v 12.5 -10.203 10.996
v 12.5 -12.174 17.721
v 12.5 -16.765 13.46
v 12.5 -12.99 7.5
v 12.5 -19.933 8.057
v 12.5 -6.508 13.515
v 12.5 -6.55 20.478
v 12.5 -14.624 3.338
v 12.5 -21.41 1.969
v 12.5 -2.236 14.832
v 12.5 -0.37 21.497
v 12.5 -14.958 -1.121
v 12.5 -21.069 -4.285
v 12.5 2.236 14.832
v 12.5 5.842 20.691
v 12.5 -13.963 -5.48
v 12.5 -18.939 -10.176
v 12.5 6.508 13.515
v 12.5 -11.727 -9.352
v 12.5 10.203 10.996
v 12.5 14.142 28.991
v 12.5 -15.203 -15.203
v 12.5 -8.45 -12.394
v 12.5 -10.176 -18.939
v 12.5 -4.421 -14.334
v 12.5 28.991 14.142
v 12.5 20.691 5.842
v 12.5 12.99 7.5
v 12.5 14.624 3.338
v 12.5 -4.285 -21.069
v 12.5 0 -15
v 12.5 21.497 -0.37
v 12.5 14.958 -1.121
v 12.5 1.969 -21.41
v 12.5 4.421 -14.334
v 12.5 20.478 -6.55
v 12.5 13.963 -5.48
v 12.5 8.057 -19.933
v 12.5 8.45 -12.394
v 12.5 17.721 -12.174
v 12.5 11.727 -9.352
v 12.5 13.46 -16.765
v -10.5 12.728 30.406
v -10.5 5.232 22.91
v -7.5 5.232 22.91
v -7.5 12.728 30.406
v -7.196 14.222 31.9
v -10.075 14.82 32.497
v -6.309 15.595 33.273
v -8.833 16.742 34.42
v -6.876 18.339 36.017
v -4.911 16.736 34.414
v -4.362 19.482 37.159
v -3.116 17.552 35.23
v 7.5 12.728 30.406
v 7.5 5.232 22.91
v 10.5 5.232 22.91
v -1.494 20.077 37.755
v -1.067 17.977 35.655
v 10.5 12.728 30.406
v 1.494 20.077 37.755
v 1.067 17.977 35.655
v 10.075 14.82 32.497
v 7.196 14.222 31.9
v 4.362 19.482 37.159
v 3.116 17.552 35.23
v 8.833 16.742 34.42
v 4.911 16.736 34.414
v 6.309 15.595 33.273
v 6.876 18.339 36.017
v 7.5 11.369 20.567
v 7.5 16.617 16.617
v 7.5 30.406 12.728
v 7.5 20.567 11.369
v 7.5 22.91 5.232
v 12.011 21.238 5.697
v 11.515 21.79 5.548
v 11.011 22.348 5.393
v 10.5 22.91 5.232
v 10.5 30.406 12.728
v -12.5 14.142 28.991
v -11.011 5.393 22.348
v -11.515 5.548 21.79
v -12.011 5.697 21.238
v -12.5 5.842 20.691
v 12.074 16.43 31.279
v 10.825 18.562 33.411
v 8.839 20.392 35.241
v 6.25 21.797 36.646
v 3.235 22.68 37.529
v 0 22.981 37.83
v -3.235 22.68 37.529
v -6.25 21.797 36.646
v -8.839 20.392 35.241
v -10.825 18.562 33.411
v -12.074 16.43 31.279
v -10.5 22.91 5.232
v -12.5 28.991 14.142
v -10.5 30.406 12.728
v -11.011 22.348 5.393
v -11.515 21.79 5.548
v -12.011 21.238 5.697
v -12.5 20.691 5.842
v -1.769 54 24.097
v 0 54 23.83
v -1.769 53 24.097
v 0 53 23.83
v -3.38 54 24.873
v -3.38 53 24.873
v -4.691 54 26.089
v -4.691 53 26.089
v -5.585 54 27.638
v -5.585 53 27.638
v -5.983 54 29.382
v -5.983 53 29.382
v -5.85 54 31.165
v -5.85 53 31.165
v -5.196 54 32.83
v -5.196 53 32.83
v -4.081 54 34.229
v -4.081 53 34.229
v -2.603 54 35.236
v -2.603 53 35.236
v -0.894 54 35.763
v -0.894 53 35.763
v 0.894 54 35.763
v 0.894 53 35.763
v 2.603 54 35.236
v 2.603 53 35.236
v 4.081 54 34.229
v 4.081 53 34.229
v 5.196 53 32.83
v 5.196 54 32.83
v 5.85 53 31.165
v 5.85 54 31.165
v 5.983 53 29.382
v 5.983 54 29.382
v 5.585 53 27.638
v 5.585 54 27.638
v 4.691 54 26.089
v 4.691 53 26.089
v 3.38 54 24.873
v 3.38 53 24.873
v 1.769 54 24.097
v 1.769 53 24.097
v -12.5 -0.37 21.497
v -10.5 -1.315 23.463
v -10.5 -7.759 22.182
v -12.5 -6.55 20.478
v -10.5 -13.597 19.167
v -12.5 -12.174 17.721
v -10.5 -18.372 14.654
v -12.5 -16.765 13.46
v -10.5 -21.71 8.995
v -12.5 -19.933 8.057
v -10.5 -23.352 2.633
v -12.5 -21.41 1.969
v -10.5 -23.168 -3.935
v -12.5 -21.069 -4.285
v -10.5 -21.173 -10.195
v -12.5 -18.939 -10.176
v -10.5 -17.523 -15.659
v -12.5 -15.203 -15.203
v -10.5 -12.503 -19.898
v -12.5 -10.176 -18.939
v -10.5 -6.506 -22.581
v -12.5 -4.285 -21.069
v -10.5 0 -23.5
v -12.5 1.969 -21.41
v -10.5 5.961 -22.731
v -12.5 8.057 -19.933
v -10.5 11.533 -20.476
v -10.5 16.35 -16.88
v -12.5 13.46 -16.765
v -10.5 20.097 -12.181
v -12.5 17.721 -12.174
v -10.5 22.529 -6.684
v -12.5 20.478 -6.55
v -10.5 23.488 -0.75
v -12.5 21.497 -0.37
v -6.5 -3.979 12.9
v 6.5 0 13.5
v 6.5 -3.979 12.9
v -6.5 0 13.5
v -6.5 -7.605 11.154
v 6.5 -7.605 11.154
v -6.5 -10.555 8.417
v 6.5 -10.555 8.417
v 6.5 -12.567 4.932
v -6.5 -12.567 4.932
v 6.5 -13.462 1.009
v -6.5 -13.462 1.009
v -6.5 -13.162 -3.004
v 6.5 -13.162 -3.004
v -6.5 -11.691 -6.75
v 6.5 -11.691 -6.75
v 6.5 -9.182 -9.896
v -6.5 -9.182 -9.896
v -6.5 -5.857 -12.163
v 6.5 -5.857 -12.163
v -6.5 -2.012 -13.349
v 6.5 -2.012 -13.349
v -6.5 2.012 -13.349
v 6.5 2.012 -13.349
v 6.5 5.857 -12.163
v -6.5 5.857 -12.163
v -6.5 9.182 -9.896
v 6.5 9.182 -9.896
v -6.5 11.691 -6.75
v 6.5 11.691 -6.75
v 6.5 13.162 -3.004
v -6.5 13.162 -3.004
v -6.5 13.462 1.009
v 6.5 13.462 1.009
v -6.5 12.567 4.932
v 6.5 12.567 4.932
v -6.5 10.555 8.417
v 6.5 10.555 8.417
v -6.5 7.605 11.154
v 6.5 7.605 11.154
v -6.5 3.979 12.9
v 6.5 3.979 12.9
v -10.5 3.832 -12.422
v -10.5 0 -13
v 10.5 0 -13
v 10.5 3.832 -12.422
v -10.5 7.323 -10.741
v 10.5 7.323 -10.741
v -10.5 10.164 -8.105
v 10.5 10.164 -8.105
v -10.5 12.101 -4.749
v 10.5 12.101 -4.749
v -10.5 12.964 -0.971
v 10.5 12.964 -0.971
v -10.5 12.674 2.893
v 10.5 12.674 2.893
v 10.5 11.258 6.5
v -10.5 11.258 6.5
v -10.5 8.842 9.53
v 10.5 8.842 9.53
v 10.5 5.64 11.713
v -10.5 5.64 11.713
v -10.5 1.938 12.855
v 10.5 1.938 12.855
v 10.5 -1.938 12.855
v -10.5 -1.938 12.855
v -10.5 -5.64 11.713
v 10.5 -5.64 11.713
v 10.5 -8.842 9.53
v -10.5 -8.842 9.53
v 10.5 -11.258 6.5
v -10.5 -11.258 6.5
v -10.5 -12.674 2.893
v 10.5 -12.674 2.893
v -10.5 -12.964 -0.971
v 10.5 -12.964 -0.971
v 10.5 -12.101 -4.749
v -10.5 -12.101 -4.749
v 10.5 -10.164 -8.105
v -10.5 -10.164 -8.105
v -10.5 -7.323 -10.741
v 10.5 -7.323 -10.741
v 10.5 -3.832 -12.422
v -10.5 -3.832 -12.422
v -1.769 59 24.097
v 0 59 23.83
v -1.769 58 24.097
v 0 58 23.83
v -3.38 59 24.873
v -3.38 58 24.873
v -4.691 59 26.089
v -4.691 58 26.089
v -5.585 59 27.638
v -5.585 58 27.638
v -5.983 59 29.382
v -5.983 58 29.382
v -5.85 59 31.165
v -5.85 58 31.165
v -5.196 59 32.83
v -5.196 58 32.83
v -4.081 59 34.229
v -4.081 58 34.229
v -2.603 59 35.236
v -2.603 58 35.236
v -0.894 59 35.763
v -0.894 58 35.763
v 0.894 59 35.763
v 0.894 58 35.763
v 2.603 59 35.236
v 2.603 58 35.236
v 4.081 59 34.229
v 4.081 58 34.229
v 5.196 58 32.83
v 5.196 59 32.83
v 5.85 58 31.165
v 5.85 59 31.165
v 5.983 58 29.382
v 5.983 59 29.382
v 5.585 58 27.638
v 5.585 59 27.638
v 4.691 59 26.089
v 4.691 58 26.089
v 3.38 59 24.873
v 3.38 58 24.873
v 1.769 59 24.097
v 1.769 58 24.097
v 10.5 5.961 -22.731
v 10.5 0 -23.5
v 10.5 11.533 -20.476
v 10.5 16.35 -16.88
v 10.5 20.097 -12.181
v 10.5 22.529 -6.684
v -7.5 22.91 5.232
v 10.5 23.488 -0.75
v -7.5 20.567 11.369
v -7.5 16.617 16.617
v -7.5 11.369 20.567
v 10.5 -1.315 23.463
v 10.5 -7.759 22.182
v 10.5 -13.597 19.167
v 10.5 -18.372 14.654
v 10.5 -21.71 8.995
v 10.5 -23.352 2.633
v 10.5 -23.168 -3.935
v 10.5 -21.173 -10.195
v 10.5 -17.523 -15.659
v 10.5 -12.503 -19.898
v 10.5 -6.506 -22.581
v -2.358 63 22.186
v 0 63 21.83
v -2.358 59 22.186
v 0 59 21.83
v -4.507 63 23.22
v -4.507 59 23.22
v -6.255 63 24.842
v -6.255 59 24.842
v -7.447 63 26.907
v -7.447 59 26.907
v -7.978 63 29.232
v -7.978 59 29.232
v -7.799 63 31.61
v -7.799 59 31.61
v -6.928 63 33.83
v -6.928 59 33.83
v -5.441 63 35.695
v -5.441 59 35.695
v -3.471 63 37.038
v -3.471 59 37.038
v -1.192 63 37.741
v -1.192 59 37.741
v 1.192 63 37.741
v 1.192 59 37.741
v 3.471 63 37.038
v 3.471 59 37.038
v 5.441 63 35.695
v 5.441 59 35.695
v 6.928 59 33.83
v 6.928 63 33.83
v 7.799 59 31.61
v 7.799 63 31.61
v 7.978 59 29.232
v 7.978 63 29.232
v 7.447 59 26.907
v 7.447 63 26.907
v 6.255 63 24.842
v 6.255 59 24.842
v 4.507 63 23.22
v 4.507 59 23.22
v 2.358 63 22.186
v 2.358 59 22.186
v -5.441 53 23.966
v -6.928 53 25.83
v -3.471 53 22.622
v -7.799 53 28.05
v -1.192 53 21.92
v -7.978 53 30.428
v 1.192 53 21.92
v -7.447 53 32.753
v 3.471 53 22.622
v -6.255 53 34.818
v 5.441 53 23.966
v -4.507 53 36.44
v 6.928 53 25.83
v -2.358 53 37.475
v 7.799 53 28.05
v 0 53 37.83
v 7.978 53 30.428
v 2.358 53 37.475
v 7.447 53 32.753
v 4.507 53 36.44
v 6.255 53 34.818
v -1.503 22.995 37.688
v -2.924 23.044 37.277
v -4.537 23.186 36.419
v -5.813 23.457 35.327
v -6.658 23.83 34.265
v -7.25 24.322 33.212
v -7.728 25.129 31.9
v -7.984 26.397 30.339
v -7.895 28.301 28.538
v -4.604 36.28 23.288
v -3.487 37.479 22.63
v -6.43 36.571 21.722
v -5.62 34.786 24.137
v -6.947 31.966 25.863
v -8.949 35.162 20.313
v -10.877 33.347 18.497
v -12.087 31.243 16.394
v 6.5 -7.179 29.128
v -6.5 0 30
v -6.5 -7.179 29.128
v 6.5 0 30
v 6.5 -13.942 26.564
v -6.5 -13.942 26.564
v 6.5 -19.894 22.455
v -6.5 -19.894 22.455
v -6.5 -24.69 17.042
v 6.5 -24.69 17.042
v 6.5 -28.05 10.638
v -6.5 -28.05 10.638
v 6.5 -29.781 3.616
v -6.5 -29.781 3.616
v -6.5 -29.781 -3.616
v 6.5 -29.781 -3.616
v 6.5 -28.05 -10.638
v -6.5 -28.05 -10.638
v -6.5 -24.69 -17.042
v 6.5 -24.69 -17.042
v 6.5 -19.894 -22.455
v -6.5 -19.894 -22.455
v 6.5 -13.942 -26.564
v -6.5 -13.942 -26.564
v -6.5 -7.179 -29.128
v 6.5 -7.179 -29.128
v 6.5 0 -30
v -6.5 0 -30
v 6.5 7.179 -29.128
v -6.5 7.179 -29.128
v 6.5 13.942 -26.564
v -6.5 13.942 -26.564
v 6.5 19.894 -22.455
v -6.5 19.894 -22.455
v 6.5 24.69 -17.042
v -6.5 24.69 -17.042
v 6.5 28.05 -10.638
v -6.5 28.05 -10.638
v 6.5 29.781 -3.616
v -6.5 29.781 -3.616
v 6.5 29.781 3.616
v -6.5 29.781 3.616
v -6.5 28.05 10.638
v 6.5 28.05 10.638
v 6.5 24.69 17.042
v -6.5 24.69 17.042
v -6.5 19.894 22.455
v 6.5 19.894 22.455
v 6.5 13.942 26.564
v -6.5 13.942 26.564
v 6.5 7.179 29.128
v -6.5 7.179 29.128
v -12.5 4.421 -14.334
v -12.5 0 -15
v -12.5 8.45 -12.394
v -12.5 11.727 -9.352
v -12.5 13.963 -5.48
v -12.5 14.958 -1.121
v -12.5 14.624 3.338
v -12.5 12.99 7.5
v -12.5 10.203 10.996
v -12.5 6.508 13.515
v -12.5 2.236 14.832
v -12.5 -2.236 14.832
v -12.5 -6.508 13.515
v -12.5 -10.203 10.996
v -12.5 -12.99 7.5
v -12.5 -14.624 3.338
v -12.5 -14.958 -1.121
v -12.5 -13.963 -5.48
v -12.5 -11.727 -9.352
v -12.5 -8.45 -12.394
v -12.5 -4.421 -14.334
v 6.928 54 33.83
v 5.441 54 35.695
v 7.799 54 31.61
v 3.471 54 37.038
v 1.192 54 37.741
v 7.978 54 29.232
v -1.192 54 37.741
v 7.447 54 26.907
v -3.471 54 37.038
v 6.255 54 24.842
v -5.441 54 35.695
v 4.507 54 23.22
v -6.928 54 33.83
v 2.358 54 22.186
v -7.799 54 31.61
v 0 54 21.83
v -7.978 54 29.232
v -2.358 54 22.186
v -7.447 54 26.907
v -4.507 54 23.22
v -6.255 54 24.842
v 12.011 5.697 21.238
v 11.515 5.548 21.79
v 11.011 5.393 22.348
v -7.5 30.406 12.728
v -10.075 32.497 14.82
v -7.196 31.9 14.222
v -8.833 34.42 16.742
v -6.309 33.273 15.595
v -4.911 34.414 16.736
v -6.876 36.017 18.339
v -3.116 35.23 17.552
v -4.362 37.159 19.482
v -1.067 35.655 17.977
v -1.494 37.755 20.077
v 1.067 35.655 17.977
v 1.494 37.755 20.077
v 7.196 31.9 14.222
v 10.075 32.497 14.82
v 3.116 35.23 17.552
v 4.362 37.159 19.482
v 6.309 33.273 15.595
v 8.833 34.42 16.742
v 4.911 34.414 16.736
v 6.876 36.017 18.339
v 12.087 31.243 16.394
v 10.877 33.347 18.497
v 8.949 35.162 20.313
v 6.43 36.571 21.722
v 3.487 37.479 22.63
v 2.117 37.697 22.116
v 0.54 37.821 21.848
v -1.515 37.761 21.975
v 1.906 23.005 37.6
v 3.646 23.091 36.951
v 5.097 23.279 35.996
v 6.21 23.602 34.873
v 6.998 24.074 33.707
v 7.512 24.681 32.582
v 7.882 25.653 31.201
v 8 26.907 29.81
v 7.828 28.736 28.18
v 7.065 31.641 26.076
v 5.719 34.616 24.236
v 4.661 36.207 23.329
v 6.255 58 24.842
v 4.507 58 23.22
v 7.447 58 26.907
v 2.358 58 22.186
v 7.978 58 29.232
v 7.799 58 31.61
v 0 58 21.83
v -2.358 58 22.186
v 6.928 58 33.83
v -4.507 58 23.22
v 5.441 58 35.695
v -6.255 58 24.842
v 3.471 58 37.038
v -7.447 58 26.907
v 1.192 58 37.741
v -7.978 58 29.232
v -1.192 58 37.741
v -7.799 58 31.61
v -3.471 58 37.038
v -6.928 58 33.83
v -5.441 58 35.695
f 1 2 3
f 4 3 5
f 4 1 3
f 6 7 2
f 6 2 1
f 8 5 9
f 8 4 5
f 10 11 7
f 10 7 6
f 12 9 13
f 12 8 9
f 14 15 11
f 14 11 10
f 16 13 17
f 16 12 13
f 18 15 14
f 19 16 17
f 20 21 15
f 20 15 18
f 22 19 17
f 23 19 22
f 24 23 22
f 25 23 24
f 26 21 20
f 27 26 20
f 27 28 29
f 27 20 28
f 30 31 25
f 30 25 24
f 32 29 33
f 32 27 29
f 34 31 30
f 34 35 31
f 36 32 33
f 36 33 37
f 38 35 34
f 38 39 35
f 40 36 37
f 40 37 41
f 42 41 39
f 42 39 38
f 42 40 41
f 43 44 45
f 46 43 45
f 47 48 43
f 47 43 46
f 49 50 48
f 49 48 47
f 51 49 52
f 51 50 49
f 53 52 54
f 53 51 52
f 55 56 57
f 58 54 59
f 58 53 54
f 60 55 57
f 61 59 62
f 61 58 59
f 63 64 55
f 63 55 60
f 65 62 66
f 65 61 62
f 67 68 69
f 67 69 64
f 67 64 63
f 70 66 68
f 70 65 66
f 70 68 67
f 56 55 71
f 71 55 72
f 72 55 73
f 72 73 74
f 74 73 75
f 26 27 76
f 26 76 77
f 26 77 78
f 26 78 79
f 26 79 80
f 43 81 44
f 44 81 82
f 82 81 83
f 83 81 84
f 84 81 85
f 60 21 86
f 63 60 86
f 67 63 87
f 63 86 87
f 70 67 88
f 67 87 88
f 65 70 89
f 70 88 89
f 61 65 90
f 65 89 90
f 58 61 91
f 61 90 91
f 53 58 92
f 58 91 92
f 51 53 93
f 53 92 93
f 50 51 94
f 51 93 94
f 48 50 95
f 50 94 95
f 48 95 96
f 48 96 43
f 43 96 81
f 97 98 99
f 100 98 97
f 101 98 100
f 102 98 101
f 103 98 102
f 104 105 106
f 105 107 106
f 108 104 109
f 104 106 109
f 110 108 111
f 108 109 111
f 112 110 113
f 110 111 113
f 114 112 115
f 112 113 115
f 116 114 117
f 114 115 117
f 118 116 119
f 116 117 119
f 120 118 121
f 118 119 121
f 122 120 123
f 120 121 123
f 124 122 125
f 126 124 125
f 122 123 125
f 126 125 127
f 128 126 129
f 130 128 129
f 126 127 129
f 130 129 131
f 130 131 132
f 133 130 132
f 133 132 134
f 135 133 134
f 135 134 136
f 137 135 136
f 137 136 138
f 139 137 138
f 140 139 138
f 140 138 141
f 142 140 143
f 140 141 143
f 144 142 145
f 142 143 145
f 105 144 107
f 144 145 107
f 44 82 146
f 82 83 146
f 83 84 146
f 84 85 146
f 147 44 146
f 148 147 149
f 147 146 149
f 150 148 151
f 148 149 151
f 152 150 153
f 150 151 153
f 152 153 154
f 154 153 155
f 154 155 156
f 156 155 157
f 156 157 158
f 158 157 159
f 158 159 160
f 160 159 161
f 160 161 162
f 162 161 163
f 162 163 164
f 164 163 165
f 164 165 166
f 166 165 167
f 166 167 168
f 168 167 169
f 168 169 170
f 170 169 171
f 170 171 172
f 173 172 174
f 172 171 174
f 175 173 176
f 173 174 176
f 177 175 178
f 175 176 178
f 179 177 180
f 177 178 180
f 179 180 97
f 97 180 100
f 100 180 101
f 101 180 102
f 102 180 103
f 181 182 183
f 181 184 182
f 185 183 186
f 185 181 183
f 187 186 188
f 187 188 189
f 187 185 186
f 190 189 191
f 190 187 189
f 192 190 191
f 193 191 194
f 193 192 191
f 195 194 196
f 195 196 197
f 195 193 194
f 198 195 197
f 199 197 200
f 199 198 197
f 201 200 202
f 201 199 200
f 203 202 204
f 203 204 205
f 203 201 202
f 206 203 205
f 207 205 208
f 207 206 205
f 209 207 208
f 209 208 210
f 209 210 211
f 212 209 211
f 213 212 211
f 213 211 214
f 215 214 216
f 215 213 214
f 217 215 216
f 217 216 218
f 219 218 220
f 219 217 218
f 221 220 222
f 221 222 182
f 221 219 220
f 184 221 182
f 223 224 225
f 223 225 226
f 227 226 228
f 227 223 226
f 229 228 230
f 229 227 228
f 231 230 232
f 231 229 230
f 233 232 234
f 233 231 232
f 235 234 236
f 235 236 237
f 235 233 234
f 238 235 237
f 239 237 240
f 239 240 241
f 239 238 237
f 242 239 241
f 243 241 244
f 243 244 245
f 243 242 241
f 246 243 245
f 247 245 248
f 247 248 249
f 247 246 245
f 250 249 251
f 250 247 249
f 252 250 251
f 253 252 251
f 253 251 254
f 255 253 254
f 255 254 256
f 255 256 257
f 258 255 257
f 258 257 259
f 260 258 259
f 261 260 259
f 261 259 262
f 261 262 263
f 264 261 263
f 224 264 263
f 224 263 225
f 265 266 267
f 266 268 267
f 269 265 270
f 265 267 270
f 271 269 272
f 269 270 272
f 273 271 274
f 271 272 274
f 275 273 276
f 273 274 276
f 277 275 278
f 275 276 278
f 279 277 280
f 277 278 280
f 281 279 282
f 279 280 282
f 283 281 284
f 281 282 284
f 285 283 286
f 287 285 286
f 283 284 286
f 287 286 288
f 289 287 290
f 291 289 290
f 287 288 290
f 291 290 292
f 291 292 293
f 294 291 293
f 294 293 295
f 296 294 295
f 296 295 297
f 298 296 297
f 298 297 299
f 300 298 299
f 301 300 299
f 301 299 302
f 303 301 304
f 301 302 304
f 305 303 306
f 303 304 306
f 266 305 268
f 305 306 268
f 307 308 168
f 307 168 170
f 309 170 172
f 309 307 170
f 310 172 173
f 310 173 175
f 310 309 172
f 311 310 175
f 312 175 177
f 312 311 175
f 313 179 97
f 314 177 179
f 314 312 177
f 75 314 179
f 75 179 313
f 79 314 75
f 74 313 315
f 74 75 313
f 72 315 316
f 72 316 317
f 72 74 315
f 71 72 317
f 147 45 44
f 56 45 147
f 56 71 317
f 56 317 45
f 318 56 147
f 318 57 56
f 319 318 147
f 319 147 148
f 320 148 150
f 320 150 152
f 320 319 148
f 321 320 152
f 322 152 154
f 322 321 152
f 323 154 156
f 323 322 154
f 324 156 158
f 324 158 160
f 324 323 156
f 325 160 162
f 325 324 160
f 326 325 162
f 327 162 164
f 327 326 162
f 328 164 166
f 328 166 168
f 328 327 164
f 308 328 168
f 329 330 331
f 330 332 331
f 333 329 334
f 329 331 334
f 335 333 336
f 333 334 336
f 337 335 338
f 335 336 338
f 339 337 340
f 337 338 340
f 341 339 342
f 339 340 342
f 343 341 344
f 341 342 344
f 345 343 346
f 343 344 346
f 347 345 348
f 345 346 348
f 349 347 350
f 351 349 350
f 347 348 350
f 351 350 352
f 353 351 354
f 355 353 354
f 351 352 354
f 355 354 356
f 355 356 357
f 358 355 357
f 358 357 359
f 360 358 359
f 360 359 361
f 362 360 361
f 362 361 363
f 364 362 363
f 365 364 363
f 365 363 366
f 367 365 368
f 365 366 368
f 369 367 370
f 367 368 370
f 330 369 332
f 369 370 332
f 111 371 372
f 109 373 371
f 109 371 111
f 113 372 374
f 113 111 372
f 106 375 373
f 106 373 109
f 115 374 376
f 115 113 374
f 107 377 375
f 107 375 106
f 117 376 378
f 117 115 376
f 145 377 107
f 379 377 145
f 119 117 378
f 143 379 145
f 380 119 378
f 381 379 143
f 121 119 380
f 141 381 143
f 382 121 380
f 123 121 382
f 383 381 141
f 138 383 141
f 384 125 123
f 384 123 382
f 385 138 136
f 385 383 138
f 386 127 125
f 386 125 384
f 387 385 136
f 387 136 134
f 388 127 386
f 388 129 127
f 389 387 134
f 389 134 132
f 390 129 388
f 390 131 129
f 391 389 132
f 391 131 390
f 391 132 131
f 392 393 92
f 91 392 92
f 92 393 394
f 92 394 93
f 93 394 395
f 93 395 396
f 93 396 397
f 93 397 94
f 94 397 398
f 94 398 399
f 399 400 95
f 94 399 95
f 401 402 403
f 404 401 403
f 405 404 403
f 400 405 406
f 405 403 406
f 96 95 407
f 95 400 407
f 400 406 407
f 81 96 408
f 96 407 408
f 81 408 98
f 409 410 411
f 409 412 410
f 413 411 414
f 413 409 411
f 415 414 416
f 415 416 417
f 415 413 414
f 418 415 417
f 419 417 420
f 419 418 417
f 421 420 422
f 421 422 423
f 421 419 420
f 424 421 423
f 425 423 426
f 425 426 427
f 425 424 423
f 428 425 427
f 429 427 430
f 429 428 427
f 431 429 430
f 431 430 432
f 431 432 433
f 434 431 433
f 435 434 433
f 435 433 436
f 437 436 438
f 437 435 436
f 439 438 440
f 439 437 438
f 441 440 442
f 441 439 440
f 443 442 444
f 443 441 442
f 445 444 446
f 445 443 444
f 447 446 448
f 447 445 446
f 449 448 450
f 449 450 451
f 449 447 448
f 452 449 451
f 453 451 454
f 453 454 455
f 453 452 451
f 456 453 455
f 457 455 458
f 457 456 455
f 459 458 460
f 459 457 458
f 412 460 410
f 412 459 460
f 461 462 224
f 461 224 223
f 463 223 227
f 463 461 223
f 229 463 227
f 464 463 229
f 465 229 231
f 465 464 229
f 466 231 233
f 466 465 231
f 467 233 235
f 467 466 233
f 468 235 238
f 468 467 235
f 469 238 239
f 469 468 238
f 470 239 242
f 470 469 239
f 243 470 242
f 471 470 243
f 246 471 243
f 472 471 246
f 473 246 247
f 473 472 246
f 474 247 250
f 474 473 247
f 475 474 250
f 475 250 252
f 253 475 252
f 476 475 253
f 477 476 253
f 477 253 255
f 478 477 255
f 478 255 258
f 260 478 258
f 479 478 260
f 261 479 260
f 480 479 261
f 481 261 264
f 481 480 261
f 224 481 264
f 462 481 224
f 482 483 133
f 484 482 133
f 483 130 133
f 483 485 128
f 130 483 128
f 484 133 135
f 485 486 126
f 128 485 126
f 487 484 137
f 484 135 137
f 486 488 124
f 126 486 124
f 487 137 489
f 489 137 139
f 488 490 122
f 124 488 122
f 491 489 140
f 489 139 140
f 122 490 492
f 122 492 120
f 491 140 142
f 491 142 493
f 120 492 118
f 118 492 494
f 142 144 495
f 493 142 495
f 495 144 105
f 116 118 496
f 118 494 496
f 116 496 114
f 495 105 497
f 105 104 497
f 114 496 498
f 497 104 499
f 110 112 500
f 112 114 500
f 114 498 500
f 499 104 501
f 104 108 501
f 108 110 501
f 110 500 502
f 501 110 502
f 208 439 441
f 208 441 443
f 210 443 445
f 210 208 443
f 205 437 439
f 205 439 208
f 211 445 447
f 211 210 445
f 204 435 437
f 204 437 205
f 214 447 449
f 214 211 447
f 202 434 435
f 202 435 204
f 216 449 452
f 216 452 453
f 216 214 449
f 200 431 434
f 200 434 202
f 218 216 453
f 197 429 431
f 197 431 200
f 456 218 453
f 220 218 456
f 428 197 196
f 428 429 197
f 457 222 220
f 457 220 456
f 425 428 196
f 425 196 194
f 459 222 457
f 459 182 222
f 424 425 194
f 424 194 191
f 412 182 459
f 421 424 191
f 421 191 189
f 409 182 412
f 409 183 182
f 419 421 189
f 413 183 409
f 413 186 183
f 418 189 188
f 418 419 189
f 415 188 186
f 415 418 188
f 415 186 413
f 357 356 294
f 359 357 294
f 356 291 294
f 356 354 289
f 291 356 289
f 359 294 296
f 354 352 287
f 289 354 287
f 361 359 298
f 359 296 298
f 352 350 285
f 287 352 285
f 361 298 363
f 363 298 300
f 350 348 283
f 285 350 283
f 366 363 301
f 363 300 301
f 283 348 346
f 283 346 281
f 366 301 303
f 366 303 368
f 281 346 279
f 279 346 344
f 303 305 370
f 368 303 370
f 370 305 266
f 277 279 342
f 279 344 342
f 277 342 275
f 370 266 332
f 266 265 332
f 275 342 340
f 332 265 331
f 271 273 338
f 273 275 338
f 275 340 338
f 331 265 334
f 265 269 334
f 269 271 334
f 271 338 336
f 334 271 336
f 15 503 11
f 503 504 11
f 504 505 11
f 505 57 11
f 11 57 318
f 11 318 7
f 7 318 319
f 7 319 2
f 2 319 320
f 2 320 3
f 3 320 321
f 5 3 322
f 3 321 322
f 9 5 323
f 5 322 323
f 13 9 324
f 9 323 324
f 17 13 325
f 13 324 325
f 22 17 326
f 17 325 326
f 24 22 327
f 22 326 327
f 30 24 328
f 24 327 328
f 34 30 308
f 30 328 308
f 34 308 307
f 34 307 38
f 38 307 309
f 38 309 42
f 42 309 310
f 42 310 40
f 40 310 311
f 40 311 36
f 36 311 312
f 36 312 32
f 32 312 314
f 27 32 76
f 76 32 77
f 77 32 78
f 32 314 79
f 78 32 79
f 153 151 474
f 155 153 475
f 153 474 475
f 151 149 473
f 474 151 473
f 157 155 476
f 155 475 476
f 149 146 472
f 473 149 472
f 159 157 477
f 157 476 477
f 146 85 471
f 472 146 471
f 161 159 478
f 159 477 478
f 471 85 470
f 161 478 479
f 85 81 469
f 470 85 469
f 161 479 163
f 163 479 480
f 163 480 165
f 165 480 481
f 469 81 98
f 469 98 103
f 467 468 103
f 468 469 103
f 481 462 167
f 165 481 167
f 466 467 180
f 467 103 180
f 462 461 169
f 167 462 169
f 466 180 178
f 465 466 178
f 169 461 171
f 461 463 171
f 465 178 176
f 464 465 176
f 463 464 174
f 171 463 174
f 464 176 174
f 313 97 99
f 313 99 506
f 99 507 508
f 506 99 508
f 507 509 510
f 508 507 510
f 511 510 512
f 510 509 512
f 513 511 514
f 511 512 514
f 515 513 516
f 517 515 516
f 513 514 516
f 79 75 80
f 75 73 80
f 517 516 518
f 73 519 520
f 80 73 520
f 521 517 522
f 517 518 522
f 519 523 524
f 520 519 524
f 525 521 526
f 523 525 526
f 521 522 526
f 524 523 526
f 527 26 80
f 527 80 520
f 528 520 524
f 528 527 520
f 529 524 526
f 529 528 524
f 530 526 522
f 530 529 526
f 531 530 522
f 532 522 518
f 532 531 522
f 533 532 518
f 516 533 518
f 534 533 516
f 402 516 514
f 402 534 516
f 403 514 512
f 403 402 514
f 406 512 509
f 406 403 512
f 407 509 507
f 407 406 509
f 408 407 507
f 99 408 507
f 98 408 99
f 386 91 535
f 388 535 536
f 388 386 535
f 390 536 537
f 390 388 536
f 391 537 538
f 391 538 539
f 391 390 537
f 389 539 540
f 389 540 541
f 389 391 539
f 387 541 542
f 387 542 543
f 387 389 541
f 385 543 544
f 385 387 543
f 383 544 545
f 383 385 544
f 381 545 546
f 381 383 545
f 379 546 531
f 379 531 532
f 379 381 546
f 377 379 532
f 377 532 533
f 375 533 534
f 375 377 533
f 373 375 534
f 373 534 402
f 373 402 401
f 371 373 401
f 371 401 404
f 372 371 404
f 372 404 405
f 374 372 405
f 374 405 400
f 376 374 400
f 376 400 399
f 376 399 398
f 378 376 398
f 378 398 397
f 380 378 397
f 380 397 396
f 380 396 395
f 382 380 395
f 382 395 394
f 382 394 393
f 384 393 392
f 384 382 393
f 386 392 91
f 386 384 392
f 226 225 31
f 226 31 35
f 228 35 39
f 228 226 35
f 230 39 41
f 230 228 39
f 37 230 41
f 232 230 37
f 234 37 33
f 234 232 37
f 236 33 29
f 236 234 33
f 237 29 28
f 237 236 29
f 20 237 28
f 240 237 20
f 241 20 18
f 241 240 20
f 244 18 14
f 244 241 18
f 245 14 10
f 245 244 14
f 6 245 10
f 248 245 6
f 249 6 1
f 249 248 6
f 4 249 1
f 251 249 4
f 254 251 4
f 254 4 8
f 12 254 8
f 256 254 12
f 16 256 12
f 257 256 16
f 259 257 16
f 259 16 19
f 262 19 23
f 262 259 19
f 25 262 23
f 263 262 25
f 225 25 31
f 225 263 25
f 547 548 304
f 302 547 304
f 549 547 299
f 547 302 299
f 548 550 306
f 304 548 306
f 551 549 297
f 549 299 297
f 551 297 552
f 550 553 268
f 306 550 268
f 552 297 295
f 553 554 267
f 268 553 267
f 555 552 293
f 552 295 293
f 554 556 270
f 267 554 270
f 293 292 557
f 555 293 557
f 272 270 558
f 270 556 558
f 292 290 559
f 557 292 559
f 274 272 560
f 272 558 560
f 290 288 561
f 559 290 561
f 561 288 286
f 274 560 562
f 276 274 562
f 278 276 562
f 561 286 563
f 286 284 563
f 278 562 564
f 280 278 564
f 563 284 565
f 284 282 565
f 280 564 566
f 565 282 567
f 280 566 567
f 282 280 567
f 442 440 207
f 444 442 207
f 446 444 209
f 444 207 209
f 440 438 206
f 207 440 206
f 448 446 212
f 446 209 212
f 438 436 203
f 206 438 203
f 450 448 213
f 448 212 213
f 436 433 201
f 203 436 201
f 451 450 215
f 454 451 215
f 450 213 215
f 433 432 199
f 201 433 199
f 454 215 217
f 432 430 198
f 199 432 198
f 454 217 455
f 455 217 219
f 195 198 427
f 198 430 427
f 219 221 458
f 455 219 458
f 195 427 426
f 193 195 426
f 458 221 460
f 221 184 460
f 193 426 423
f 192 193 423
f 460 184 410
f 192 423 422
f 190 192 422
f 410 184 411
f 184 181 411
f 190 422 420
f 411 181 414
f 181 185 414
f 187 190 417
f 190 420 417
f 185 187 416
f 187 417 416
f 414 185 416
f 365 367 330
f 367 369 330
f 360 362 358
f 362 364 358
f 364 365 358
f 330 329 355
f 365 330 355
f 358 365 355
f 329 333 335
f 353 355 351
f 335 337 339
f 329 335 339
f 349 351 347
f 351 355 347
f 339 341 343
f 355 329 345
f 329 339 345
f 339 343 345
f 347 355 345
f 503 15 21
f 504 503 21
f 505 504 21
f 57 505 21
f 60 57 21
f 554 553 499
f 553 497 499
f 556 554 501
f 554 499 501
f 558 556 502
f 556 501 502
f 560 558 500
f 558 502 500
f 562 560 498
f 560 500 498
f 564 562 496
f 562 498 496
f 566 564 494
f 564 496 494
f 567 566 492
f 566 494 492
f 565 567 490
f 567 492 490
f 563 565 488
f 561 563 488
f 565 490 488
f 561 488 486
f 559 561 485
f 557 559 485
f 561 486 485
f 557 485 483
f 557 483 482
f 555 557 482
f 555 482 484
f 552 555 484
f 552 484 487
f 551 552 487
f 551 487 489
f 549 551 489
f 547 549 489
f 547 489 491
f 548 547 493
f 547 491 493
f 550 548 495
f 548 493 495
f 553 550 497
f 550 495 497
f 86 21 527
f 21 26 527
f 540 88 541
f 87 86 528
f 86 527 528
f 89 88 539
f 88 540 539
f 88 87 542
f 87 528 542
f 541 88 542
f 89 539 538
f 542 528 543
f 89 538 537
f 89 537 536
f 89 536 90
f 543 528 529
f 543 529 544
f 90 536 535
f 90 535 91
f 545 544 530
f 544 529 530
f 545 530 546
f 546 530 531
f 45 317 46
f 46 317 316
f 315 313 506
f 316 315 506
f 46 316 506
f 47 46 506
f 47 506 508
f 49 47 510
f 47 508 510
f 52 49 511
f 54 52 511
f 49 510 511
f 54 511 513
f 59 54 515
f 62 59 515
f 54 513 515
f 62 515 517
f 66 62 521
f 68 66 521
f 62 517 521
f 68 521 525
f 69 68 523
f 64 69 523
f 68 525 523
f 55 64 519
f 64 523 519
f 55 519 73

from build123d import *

# Parameters (mm, degrees)
SKETCH1_R           = 30
SKETCH1_R_2         = 13.5
BOSS_EXTRUDE1_DEPTH = 6.5
SKETCH2_R           = 23.5
SKETCH2_R_2         = 13
BOSS_EXTRUDE2_DEPTH = 12.5
BOSS_EXTRUDE3_DEPTH = 12.5
CHAMFER1_SIZE       = 2
BOSS_EXTRUDE4_REACH = 94.067
SKETCH5_R           = 8


with BuildPart() as part:
    # Sketch1 → Boss-Extrude1 (new, symmetric)
    with BuildSketch(Plane(origin=(0, 0, 0), x_dir=(0, 0, -1), z_dir=(1, 0, 0))):
        with Locations(Location((0, 0, 0), (0, 0, 180))):
            Circle(SKETCH1_R)
        with Locations(Location((0, 0, 0), (0, 0, 180))):
            Circle(SKETCH1_R_2, mode=Mode.SUBTRACT)
    extrude(amount=BOSS_EXTRUDE1_DEPTH, both=True)


with BuildPart() as body_2:
    # Sketch2 → Boss-Extrude2 (new, symmetric)
    with BuildSketch(Plane(origin=(0, 0, 0), x_dir=(0, 0, -1), z_dir=(1, 0, 0))):
        Circle(SKETCH2_R)
        Circle(SKETCH2_R_2, mode=Mode.SUBTRACT)
    extrude(amount=BOSS_EXTRUDE2_DEPTH, both=True)

    # Sketch4 → Boss-Extrude3 (add, symmetric)
    with BuildSketch(Plane(origin=(0, 0, 0), x_dir=(-1, 0, 0), z_dir=(0, 0.7071067811865475, -0.7071067811865477))):
        with BuildLine():
            Line((-12.5, 18.5), (-12.5, 30.5))
            ThreePointArc((-12.5, 30.5), (0, 43), (12.5, 30.5))
            Line((12.5, 30.5), (12.5, 18.5))
            Line((12.5, 18.5), (7.5, 18.5))
            Line((7.5, 18.5), (7.5, 30.5))
            ThreePointArc((7.5, 30.5), (0, 38), (-7.5, 30.5))
            Line((-7.5, 30.5), (-7.5, 18.5))
            Line((-7.5, 18.5), (-12.5, 18.5))
        make_face()
    extrude(amount=BOSS_EXTRUDE3_DEPTH, both=True)

    # Chamfer1
    chamfer1_edges = [body_2.edges().sort_by_distance(p)[0] for p in [
        (12.5, -23.352054814, 2.632781035),
        (-12.5, -23.352054814, 2.632781035),
        (-12.5, 26.657836818, 8.980167288),
        (0, 39.244426356, 21.566756826),
        (12.5, 26.657836818, 8.980167288),
        (-12.5, 8.980167288, 26.657836818),
        (0, 21.566756826, 39.244426356),
        (12.5, 8.980167288, 26.657836818),
        (-12.5, 0, 13),
        (12.5, 0, 13),
    ]]
    chamfer(chamfer1_edges, length=CHAMFER1_SIZE)

    # Sketch5 → Boss-Extrude4 (add, up to next)
    with BuildSketch(Plane(origin=(0, 53, 0), x_dir=(1, 0, 0), z_dir=(0, 1, 0)), mode=Mode.PRIVATE) as boss_extrude4_sk1:
        with Locations(Location((0, -29.830212793, 0), (0, 0, 270))):
            Circle(SKETCH5_R)
    boss_extrude4_tool1 = extrude(boss_extrude4_sk1.sketch, amount=-BOSS_EXTRUDE4_REACH, mode=Mode.PRIVATE) - body_2.part
    add(boss_extrude4_tool1.solids().sort_by_distance((0, 53, 29.830213))[0])

    # Sketch6 → Revolve1 (revolve)
    with BuildSketch(Plane(origin=(0, 0, 0), x_dir=(0, 0, -1), z_dir=(1, 0, 0))):
        Polygon((-29.830212793, 53), (-29.830212793, 63), (-21.830212793, 63), (-21.830212793, 59), (-23.830212793, 59), (-23.830212793, 58), (-21.830212793, 58), (-21.830212793, 54), (-23.830212793, 54), (-23.830212793, 53), align=None)
    revolve(axis=Axis((0, 53, 29.830212793), (0, 1, 0)))


solid = Compound([part.part, body_2.part])
